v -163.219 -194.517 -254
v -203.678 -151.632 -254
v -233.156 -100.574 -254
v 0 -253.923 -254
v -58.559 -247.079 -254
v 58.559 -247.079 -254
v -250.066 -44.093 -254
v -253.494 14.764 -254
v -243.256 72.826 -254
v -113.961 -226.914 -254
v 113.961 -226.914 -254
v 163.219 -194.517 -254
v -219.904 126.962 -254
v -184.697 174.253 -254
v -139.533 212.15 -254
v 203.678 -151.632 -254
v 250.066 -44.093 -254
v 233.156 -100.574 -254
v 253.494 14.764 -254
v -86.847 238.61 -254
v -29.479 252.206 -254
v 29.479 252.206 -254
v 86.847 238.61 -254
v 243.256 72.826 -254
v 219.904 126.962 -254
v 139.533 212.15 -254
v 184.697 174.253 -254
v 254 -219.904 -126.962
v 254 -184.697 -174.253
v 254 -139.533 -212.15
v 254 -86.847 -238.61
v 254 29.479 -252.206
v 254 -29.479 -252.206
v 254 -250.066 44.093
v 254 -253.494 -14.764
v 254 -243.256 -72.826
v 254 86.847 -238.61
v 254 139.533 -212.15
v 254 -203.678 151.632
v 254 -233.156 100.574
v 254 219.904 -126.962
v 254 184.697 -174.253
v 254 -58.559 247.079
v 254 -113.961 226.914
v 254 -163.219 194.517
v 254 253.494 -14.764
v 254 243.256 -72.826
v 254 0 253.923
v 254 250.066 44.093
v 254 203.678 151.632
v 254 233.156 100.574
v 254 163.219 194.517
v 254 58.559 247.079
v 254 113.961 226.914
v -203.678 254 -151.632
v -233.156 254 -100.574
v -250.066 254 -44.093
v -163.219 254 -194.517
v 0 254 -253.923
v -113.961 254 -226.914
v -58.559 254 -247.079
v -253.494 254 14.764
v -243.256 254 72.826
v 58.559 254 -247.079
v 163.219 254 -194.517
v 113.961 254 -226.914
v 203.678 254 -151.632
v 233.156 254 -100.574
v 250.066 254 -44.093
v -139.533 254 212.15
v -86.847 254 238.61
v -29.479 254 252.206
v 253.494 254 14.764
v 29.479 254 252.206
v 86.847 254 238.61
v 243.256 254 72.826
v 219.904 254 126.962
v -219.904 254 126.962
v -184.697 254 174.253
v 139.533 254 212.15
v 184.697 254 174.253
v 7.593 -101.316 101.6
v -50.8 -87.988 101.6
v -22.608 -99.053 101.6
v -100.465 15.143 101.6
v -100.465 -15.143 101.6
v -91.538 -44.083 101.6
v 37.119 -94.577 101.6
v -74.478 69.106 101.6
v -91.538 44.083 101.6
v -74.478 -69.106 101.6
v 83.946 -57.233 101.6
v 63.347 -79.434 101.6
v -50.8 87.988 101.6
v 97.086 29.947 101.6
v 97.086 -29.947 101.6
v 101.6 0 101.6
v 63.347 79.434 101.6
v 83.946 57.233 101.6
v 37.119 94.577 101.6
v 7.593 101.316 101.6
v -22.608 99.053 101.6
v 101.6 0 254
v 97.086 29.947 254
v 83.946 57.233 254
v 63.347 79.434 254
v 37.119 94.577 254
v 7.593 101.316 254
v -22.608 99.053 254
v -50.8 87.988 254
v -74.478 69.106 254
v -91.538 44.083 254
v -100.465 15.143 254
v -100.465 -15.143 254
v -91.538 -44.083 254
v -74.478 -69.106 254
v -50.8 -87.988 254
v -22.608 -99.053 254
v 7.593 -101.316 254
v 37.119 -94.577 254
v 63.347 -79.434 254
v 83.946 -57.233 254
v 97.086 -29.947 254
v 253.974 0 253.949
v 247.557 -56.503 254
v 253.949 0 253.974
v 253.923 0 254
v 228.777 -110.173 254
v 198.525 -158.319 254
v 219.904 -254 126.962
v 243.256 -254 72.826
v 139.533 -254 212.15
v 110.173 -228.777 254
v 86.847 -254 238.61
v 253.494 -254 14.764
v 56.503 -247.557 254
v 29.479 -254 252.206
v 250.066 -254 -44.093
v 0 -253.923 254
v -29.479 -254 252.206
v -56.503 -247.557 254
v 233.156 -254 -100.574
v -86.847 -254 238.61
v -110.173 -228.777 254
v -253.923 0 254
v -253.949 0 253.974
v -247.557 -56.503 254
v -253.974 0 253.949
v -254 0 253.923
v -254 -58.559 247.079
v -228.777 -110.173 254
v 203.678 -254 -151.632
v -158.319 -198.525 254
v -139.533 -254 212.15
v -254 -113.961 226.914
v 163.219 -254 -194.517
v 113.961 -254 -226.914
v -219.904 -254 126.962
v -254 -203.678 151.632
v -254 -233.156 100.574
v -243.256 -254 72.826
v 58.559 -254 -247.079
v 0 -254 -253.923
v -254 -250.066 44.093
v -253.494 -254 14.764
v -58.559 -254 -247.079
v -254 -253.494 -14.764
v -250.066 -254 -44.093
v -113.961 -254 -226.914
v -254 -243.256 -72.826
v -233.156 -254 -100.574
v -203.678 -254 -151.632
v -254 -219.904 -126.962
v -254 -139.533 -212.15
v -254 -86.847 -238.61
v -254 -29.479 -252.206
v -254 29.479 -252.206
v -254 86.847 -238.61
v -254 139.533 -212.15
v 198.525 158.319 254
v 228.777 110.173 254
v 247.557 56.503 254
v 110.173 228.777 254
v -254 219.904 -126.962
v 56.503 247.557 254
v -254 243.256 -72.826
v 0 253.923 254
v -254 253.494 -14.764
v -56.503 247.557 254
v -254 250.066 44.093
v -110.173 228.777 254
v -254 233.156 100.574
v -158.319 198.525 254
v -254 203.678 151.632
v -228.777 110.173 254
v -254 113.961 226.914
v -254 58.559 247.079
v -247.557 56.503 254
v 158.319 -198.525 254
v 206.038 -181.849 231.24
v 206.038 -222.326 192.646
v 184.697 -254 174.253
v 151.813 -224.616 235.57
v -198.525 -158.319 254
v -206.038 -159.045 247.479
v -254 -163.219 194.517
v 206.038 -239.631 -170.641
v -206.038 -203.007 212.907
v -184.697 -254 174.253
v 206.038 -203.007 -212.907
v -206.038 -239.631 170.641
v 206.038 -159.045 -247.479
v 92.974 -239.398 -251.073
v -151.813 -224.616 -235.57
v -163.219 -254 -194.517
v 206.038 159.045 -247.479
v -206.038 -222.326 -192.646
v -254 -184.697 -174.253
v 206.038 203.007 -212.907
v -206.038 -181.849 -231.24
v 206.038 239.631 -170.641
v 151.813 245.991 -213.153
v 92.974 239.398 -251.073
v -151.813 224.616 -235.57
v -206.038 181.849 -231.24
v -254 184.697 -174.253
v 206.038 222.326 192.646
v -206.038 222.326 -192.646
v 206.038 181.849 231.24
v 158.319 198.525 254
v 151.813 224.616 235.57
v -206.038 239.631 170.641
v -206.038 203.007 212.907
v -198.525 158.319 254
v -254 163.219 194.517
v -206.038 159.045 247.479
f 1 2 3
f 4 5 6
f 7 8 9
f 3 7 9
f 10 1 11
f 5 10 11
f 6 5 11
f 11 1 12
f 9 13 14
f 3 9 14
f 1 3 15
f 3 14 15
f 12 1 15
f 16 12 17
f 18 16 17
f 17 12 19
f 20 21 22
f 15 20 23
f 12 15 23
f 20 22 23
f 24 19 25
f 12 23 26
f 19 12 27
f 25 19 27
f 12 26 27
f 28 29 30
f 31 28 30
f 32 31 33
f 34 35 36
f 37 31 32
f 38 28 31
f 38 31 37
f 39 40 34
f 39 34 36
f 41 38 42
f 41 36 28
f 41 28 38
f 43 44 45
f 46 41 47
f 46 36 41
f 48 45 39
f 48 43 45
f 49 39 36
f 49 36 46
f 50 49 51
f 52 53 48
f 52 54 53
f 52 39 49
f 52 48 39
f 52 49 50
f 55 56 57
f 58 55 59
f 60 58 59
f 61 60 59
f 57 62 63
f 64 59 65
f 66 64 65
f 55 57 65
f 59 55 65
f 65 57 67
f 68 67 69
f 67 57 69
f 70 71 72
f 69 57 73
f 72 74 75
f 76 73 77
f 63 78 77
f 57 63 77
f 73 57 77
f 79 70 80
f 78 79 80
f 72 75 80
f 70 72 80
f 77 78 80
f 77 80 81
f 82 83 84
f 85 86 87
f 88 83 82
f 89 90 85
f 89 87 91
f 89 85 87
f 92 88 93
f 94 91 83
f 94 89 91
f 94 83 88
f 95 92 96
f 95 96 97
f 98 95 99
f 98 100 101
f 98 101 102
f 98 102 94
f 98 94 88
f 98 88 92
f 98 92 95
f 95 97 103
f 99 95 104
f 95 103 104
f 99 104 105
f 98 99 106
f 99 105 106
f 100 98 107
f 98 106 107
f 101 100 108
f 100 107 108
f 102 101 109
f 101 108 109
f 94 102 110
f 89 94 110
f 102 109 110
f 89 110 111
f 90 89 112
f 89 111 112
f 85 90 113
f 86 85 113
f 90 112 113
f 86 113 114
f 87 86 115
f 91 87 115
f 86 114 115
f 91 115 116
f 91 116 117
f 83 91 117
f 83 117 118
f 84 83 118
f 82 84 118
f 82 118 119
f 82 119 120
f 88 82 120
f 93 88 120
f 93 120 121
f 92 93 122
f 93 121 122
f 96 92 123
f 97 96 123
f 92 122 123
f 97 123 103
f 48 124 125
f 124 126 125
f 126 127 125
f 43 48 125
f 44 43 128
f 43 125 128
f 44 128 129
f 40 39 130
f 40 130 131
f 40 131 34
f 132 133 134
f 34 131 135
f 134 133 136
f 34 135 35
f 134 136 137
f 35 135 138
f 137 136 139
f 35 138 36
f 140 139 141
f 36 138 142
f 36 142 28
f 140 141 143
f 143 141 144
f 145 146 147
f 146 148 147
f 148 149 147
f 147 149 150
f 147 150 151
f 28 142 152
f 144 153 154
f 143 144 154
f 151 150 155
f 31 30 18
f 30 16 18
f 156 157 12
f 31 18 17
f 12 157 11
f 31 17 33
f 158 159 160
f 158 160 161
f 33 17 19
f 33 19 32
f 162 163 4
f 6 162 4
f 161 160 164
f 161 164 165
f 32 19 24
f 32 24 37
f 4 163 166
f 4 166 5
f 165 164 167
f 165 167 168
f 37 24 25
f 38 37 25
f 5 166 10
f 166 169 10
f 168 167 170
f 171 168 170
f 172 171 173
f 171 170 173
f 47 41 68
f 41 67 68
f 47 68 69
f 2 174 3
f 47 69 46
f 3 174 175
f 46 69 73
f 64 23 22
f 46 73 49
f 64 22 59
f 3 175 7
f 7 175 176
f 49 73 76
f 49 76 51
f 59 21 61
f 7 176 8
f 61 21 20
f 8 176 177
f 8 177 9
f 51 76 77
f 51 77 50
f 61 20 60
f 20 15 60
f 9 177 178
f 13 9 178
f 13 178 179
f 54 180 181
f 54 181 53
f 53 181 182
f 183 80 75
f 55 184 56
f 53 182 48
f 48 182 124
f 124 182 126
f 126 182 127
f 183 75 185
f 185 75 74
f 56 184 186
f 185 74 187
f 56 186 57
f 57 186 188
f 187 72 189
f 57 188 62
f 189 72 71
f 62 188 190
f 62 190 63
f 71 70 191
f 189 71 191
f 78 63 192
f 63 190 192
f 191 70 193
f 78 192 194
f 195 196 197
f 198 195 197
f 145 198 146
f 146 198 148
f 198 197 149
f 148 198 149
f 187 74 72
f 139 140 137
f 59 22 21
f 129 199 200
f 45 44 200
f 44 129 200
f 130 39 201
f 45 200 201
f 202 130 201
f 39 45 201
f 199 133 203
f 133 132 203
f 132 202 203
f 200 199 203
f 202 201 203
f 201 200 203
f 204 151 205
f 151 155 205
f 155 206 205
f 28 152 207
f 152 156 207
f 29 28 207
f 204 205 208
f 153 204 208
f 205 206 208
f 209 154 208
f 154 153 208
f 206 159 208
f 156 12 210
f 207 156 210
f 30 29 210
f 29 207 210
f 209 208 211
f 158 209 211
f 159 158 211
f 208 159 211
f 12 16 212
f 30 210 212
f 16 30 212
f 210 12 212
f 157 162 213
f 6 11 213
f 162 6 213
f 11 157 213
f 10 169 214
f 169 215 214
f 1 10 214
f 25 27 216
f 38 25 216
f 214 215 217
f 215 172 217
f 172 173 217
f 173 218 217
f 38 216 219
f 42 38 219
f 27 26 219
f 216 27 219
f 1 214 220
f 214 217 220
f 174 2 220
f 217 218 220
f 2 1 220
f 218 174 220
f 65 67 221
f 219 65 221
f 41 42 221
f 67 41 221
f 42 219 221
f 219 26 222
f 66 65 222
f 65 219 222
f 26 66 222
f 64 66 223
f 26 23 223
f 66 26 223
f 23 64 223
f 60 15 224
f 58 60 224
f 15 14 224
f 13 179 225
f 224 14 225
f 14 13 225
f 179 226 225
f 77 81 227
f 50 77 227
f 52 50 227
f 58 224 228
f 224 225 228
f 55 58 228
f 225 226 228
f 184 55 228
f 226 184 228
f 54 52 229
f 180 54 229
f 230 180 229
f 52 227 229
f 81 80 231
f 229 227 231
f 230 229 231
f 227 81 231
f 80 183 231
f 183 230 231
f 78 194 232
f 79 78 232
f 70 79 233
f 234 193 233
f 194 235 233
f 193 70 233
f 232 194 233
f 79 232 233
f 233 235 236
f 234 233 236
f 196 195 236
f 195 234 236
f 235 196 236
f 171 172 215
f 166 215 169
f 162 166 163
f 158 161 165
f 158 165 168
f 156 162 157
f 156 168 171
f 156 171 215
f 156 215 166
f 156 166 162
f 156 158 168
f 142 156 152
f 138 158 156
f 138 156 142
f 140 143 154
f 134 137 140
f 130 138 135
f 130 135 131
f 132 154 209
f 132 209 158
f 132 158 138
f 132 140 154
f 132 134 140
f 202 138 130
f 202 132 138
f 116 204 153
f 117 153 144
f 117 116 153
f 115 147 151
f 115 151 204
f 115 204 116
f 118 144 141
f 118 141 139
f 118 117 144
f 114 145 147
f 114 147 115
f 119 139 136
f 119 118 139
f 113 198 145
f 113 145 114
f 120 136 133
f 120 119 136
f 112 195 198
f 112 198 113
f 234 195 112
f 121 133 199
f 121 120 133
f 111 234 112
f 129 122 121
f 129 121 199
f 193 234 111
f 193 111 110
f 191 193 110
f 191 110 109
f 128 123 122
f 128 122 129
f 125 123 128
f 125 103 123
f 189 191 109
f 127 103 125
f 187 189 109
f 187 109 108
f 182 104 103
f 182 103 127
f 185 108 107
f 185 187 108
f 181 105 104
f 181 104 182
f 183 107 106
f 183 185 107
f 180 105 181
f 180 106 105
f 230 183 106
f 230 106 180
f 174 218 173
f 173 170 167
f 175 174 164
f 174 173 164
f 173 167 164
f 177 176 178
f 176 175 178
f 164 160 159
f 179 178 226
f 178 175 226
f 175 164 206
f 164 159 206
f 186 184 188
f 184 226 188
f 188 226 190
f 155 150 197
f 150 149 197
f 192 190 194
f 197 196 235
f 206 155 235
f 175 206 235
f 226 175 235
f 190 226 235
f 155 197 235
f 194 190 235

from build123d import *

# Parameters (mm, degrees)
F3_W      = 890.734077
F3_H      = 1319.233716
F4_DEPTH  = 254
F6_W      = 1012.359947
F6_H      = 1290.58224
F7_DEPTH  = 254
F10_DEPTH = 254
F12_W     = 1270.54733
F12_H     = 1196.680188
F13_DEPTH = 254
F15_W     = 950.985431
F15_H     = 1887.960911
F16_DEPTH = 254
F19_DEPTH = 254
F20_R     = 101.6
F21_DEPTH = 152.4


with BuildPart() as f1:
    # F0 (on Front) → F1 (revolve)
    with BuildSketch(Plane.XZ):
        with BuildLine():
            Line((-359.156, 0), (0, 0))
            Line((0, 0), (359.156, 0))
            ThreePointArc((359.156, 0), (0, 359.156), (-359.156, 0))
        make_face()
    revolve(axis=Axis((179.578, 0, 0), (1, 0, 0)))

    # F3 (on offset) → F4 (cut)
    with BuildSketch(Plane.XZ.offset(254)):
        with Locations((-42.36114, 63.51766)):
            Rectangle(F3_W, F3_H)
    extrude(amount=F4_DEPTH, mode=Mode.SUBTRACT)

    # F6 (on offset) → F7 (cut)
    with BuildSketch(Plane.XZ.offset(-254)):
        with Locations((-90.278938, 130.936891)):
            Rectangle(F6_W, F6_H)
    extrude(amount=-F7_DEPTH, mode=Mode.SUBTRACT)

    # F9 (on offset) → F10 (cut)
    with BuildSketch(Plane.XY.offset(254)):
        Polygon((-582.261324, -515.396833), (446.441472, -515.396833), (446.441472, -508.58891), (456.421018, -508.58891), (456.421018, 446.415097), (-582.261324, 446.415097), align=None)
    extrude(amount=F10_DEPTH, mode=Mode.SUBTRACT)

    # F12 (on offset) → F13 (cut)
    with BuildSketch(Plane.XY.offset(-254)):
        with Locations((82.284361, 80.805302)):
            Rectangle(F12_W, F12_H)
    extrude(amount=-F13_DEPTH, mode=Mode.SUBTRACT)

    # F15 (on offset) → F16 (cut)
    with BuildSketch(Plane.YZ.offset(-254)):
        with Locations((-55.342019, -317.589998)):
            Rectangle(F15_W, F15_H)
    extrude(amount=-F16_DEPTH, mode=Mode.SUBTRACT)

    # F18 (on offset) → F19 (cut)
    with BuildSketch(Plane.YZ.offset(254)):
        Polygon((-462.633133, 1110.26144), (-462.633133, 1077.45111), (-462.633133, -1249.087334), (636.57546, -1249.087334), (636.57546, 1110.26144), align=None)
    extrude(amount=F19_DEPTH, mode=Mode.SUBTRACT)

    # F20 (on face) → F21 (cut)
    with BuildSketch(Plane.XY.offset(254)):
        Circle(F20_R)
    extrude(amount=-F21_DEPTH, mode=Mode.SUBTRACT)


solid = f1.part
